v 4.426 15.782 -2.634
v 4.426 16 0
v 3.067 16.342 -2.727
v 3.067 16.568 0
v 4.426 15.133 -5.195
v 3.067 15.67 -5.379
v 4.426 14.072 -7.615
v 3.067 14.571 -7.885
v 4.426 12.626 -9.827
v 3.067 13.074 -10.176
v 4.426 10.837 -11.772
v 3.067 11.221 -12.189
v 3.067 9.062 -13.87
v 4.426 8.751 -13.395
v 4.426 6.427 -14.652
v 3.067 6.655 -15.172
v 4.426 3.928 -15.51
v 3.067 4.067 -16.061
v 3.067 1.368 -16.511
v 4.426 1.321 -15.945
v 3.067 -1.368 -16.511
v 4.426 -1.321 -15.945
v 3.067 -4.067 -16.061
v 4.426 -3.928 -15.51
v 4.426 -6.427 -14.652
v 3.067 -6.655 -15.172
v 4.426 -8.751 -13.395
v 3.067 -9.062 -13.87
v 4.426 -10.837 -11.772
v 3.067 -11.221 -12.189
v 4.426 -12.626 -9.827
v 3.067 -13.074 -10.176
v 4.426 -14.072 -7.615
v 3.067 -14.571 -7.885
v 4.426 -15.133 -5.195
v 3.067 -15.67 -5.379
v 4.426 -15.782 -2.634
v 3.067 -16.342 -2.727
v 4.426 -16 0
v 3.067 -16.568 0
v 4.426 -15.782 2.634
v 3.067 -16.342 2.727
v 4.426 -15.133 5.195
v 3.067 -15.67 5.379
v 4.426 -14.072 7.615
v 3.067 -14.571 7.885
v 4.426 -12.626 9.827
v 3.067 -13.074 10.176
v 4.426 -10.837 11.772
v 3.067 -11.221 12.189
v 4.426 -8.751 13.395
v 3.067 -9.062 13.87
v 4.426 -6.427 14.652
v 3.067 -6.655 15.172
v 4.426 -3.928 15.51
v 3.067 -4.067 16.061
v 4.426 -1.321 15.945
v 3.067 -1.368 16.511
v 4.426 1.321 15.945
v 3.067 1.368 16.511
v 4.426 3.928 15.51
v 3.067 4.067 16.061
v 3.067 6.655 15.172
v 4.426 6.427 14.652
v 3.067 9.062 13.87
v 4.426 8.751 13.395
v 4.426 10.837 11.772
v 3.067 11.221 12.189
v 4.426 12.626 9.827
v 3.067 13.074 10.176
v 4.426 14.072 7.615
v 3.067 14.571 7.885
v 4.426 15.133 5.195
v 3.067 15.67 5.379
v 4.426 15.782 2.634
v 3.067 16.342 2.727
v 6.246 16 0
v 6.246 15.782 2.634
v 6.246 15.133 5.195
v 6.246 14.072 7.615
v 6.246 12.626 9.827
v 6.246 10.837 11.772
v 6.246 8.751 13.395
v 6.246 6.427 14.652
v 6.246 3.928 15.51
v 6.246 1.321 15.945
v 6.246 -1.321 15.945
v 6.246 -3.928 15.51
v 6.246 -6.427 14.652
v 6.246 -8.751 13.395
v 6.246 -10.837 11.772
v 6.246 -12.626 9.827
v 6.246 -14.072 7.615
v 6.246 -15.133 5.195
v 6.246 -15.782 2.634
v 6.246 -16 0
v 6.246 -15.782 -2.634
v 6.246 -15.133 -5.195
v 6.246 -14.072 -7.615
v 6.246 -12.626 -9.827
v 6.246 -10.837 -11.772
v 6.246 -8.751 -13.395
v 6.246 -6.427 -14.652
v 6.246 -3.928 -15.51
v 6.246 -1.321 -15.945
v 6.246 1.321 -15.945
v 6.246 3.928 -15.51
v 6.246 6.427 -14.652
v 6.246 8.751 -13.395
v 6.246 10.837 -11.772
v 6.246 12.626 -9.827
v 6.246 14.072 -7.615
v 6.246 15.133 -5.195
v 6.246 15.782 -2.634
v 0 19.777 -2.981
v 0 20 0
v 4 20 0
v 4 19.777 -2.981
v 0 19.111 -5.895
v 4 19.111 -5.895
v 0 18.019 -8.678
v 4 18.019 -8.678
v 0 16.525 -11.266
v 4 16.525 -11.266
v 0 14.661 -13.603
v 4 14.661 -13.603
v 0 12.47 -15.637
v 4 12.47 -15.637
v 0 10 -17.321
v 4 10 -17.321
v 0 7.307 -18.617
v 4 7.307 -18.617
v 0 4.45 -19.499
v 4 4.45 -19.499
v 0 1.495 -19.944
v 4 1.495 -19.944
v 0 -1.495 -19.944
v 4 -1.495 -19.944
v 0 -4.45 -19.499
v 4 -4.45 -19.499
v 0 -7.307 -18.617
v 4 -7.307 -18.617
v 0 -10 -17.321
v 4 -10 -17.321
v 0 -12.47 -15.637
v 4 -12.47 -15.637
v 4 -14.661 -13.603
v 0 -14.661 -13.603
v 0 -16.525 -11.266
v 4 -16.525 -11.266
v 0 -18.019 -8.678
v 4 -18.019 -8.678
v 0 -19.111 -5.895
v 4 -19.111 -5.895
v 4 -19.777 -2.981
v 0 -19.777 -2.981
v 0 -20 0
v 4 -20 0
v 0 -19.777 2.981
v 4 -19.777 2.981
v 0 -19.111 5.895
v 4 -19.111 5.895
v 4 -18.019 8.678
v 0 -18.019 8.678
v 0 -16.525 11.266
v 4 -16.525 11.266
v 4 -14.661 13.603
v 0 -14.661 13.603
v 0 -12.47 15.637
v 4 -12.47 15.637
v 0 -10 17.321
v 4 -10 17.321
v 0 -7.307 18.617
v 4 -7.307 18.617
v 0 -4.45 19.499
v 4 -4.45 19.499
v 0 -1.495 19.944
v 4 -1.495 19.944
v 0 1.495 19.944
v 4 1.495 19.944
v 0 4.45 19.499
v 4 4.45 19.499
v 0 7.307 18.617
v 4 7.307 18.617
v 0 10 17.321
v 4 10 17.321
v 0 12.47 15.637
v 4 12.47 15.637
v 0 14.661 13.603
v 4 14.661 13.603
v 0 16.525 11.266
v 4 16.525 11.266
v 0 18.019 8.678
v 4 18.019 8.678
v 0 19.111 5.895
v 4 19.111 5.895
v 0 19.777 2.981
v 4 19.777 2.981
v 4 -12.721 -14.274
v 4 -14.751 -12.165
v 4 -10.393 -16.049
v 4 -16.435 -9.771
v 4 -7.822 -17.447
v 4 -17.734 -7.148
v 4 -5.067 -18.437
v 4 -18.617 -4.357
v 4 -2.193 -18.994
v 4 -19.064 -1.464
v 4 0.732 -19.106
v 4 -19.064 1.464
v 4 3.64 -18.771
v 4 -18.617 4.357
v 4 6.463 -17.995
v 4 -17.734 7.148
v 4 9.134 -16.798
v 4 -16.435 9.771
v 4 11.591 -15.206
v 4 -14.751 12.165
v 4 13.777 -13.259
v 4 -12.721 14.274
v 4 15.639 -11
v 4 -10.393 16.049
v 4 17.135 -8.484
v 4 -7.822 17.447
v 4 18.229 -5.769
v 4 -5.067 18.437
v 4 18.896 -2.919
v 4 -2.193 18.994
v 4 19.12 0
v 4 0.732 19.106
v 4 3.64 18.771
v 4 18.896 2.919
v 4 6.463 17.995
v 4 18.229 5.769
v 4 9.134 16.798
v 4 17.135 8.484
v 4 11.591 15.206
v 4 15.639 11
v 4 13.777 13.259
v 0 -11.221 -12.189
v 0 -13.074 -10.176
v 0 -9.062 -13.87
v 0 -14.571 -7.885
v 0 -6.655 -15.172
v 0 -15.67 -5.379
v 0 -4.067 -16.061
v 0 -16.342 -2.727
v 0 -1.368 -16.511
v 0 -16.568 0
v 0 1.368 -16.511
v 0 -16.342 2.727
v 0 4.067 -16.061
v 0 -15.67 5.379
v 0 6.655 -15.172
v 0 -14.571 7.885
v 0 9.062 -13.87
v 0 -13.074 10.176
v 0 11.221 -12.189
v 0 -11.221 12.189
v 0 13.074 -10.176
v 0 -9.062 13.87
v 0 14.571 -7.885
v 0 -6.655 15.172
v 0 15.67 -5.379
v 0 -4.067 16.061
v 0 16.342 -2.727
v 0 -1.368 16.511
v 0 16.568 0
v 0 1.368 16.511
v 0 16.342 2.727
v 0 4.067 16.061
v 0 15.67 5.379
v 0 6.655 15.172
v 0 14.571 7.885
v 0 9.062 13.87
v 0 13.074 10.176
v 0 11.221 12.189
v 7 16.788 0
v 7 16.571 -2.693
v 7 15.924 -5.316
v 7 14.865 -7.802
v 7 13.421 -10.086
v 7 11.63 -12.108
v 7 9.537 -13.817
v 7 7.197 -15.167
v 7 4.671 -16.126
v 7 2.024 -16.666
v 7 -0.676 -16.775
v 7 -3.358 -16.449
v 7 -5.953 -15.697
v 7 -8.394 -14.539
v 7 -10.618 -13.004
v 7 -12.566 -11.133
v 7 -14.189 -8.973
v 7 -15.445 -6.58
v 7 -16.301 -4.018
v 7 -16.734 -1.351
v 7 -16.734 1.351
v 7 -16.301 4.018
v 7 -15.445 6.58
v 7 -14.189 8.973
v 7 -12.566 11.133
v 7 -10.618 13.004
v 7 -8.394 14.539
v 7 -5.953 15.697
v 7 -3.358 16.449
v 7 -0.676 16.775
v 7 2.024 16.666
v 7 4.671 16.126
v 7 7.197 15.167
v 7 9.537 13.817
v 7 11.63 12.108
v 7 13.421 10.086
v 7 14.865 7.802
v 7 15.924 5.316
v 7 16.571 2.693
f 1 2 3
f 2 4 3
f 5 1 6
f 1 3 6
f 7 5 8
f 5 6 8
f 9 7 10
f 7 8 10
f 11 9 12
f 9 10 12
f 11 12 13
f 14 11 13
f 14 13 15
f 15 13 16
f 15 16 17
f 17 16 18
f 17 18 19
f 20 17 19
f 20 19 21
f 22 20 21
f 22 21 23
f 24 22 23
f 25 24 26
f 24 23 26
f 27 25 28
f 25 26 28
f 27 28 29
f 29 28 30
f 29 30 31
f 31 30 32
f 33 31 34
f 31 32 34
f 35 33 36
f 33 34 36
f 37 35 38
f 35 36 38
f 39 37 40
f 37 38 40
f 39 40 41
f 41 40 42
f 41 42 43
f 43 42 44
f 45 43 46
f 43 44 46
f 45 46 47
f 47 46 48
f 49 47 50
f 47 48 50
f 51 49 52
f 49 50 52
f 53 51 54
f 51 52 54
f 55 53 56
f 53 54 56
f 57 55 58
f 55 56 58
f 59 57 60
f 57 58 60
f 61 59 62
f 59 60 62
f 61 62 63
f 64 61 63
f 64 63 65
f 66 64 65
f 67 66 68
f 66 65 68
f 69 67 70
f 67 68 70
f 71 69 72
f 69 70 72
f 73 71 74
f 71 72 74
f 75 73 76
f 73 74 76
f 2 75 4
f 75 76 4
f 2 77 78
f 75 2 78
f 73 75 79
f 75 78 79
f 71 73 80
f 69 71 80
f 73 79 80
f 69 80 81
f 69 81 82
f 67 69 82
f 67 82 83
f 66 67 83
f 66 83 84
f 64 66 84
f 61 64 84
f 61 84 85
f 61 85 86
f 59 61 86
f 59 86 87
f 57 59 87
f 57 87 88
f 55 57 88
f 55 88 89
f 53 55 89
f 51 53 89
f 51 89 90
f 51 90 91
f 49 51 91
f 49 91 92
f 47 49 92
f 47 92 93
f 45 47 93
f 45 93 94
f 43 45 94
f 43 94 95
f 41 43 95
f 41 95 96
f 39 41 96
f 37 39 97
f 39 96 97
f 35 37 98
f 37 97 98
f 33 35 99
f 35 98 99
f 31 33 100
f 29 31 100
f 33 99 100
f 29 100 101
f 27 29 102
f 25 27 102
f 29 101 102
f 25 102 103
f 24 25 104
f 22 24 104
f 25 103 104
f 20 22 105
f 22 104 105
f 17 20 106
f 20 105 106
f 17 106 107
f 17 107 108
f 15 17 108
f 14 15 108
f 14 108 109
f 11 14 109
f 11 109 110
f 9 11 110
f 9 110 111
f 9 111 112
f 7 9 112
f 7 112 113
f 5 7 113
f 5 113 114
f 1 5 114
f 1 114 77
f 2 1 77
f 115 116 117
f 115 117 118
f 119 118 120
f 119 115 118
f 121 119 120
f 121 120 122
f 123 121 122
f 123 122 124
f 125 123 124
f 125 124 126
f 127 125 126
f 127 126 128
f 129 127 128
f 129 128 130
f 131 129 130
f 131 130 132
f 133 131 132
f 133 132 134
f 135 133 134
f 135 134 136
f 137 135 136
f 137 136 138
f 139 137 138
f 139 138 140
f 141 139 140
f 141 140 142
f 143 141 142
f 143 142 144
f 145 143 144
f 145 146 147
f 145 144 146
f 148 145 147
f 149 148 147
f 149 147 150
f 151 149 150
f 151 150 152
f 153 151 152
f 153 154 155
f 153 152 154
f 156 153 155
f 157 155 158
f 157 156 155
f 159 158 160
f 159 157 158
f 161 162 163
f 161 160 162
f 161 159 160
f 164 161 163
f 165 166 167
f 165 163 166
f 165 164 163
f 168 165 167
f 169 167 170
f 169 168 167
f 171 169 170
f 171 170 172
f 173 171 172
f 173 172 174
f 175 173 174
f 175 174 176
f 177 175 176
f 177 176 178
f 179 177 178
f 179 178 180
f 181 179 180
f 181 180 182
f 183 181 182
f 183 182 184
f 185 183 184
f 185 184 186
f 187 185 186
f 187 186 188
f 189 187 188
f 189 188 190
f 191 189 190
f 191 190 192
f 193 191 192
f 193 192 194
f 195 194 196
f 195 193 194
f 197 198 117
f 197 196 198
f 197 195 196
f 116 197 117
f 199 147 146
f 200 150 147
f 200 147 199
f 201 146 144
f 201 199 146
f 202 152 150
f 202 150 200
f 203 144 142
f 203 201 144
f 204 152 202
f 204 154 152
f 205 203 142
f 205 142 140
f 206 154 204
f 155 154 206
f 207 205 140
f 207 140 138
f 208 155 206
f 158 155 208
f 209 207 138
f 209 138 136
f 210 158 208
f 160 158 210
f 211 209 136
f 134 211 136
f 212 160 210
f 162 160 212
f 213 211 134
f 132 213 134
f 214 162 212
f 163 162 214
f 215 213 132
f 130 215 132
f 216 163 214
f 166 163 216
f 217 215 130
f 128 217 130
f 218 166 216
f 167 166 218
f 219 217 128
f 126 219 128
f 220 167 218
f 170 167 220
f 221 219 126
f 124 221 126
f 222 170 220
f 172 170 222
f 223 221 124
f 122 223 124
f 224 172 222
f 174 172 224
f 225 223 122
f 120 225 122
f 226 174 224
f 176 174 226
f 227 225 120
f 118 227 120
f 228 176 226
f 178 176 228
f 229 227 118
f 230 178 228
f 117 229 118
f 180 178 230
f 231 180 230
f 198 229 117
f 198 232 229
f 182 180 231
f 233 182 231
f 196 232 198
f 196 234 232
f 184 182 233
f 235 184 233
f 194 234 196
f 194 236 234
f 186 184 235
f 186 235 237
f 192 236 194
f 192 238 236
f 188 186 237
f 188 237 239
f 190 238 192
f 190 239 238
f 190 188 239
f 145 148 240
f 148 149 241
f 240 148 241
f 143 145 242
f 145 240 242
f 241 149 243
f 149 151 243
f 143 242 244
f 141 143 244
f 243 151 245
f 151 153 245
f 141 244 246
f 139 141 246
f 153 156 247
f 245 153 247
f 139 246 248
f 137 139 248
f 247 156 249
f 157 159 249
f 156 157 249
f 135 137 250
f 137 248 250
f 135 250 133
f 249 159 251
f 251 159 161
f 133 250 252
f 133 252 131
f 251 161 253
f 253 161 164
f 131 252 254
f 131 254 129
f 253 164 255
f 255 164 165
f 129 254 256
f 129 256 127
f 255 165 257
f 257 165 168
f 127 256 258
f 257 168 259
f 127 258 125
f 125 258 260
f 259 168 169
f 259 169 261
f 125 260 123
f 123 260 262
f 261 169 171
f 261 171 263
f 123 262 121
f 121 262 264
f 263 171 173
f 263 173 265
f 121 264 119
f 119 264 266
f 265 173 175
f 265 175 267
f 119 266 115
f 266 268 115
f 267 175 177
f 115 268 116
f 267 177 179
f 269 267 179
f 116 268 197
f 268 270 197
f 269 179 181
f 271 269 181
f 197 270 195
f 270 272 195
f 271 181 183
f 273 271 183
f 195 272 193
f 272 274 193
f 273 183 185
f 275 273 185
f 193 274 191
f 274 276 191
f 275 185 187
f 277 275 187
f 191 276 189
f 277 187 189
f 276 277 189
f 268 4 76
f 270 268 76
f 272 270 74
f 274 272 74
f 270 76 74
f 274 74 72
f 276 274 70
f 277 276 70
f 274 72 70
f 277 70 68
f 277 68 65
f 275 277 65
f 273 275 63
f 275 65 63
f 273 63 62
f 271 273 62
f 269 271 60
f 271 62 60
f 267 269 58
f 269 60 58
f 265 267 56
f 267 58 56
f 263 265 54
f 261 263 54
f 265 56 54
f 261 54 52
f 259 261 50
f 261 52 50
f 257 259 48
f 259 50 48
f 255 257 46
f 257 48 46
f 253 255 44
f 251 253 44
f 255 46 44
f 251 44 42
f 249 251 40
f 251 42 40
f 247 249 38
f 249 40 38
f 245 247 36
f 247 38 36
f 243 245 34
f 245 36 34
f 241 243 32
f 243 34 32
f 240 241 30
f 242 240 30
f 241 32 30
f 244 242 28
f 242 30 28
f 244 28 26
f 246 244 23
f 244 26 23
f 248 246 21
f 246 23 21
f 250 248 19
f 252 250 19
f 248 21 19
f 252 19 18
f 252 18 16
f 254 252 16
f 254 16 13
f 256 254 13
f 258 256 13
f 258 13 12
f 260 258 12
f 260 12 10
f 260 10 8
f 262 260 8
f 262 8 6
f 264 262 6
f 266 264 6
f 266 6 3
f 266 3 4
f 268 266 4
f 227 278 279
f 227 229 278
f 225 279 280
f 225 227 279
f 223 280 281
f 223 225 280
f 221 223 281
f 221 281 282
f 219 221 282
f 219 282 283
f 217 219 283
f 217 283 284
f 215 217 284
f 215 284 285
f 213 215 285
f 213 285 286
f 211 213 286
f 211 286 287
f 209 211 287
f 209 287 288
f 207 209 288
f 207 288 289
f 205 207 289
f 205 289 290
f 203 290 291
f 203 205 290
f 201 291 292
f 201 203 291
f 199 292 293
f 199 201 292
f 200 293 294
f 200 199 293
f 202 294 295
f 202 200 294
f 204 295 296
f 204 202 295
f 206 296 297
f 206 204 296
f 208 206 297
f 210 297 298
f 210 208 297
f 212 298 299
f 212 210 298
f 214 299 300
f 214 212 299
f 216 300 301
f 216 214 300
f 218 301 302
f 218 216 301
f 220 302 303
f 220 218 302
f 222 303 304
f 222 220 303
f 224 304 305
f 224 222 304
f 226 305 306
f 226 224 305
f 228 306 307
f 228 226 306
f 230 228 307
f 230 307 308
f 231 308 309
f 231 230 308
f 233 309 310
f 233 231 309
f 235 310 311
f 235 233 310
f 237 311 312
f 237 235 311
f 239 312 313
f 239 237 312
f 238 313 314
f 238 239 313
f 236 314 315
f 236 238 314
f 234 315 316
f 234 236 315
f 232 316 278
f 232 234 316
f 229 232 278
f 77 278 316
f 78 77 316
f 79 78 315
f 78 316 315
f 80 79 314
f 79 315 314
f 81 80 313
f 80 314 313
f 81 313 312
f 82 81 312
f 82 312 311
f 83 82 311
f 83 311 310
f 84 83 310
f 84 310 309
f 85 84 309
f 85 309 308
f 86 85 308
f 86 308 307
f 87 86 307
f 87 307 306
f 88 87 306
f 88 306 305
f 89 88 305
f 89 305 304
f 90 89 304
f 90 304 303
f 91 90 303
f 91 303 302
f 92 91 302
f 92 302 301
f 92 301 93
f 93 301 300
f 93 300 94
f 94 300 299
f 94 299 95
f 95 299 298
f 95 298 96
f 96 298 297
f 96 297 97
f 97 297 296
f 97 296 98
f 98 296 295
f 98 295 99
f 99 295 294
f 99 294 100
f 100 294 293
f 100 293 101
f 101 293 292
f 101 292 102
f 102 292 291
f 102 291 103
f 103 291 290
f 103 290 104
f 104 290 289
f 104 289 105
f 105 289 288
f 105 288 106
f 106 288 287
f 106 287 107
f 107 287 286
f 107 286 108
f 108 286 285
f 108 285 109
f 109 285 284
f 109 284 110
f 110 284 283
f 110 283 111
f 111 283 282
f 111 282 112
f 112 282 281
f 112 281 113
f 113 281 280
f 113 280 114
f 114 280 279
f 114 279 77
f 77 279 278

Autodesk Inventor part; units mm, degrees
ref_plane "YZ Plane" through (0, 0, 0) normal (1, 0, 0) x (0, 1, 0)
ref_plane "XZ Plane" through (0, 0, 0) normal (0, 1, 0) x (-1, 0, 0)
ref_plane "XY Plane" through (0, 0, 0) normal (0, 0, 1) x (1, 0, 0)
sketch "Sketch1" plane through (0, 0, 0) normal (0, 0, 1) x (1, 0, 0)
  line L0 (4, 19.1204) -> (4, 20)
  line L1 (4, 20) -> (0, 20)
  line L2 (0, 20) -> (0, 16.5676)
  line L3 (0, 16.5676) -> (3.0669, 16.5676)
  line L4 (3.0669, 16.5676) -> (4.4257, 16)
  line L5 (4.4257, 16) -> (6.2458, 16)
  line L6 (6.2458, 16) -> (7, 16.7884)
  line L7 (7, 16.7884) -> (4, 19.1204)
  line L8 (0, 0) -> (20.4487, 0)
  dimension "d0" = 84.13
  dimension "d1" = 133.729
  dimension "d2" = 111.058
  dimension "d3" = 4
  dimension "d4" = 0.5675
  dimension "d5" = 4
  dimension "d6" = 0.7884
  dimension "d7" = 3
  dimension "d8" = 1.7197
  dimension "d9" = 32
revolve "Revolution1" add sketch "Sketch1" angle 360 about axis through (0, 0, 0) along (1, 0, 0)
properties part number "3136 7009 55" material "Nylon 6/6"
